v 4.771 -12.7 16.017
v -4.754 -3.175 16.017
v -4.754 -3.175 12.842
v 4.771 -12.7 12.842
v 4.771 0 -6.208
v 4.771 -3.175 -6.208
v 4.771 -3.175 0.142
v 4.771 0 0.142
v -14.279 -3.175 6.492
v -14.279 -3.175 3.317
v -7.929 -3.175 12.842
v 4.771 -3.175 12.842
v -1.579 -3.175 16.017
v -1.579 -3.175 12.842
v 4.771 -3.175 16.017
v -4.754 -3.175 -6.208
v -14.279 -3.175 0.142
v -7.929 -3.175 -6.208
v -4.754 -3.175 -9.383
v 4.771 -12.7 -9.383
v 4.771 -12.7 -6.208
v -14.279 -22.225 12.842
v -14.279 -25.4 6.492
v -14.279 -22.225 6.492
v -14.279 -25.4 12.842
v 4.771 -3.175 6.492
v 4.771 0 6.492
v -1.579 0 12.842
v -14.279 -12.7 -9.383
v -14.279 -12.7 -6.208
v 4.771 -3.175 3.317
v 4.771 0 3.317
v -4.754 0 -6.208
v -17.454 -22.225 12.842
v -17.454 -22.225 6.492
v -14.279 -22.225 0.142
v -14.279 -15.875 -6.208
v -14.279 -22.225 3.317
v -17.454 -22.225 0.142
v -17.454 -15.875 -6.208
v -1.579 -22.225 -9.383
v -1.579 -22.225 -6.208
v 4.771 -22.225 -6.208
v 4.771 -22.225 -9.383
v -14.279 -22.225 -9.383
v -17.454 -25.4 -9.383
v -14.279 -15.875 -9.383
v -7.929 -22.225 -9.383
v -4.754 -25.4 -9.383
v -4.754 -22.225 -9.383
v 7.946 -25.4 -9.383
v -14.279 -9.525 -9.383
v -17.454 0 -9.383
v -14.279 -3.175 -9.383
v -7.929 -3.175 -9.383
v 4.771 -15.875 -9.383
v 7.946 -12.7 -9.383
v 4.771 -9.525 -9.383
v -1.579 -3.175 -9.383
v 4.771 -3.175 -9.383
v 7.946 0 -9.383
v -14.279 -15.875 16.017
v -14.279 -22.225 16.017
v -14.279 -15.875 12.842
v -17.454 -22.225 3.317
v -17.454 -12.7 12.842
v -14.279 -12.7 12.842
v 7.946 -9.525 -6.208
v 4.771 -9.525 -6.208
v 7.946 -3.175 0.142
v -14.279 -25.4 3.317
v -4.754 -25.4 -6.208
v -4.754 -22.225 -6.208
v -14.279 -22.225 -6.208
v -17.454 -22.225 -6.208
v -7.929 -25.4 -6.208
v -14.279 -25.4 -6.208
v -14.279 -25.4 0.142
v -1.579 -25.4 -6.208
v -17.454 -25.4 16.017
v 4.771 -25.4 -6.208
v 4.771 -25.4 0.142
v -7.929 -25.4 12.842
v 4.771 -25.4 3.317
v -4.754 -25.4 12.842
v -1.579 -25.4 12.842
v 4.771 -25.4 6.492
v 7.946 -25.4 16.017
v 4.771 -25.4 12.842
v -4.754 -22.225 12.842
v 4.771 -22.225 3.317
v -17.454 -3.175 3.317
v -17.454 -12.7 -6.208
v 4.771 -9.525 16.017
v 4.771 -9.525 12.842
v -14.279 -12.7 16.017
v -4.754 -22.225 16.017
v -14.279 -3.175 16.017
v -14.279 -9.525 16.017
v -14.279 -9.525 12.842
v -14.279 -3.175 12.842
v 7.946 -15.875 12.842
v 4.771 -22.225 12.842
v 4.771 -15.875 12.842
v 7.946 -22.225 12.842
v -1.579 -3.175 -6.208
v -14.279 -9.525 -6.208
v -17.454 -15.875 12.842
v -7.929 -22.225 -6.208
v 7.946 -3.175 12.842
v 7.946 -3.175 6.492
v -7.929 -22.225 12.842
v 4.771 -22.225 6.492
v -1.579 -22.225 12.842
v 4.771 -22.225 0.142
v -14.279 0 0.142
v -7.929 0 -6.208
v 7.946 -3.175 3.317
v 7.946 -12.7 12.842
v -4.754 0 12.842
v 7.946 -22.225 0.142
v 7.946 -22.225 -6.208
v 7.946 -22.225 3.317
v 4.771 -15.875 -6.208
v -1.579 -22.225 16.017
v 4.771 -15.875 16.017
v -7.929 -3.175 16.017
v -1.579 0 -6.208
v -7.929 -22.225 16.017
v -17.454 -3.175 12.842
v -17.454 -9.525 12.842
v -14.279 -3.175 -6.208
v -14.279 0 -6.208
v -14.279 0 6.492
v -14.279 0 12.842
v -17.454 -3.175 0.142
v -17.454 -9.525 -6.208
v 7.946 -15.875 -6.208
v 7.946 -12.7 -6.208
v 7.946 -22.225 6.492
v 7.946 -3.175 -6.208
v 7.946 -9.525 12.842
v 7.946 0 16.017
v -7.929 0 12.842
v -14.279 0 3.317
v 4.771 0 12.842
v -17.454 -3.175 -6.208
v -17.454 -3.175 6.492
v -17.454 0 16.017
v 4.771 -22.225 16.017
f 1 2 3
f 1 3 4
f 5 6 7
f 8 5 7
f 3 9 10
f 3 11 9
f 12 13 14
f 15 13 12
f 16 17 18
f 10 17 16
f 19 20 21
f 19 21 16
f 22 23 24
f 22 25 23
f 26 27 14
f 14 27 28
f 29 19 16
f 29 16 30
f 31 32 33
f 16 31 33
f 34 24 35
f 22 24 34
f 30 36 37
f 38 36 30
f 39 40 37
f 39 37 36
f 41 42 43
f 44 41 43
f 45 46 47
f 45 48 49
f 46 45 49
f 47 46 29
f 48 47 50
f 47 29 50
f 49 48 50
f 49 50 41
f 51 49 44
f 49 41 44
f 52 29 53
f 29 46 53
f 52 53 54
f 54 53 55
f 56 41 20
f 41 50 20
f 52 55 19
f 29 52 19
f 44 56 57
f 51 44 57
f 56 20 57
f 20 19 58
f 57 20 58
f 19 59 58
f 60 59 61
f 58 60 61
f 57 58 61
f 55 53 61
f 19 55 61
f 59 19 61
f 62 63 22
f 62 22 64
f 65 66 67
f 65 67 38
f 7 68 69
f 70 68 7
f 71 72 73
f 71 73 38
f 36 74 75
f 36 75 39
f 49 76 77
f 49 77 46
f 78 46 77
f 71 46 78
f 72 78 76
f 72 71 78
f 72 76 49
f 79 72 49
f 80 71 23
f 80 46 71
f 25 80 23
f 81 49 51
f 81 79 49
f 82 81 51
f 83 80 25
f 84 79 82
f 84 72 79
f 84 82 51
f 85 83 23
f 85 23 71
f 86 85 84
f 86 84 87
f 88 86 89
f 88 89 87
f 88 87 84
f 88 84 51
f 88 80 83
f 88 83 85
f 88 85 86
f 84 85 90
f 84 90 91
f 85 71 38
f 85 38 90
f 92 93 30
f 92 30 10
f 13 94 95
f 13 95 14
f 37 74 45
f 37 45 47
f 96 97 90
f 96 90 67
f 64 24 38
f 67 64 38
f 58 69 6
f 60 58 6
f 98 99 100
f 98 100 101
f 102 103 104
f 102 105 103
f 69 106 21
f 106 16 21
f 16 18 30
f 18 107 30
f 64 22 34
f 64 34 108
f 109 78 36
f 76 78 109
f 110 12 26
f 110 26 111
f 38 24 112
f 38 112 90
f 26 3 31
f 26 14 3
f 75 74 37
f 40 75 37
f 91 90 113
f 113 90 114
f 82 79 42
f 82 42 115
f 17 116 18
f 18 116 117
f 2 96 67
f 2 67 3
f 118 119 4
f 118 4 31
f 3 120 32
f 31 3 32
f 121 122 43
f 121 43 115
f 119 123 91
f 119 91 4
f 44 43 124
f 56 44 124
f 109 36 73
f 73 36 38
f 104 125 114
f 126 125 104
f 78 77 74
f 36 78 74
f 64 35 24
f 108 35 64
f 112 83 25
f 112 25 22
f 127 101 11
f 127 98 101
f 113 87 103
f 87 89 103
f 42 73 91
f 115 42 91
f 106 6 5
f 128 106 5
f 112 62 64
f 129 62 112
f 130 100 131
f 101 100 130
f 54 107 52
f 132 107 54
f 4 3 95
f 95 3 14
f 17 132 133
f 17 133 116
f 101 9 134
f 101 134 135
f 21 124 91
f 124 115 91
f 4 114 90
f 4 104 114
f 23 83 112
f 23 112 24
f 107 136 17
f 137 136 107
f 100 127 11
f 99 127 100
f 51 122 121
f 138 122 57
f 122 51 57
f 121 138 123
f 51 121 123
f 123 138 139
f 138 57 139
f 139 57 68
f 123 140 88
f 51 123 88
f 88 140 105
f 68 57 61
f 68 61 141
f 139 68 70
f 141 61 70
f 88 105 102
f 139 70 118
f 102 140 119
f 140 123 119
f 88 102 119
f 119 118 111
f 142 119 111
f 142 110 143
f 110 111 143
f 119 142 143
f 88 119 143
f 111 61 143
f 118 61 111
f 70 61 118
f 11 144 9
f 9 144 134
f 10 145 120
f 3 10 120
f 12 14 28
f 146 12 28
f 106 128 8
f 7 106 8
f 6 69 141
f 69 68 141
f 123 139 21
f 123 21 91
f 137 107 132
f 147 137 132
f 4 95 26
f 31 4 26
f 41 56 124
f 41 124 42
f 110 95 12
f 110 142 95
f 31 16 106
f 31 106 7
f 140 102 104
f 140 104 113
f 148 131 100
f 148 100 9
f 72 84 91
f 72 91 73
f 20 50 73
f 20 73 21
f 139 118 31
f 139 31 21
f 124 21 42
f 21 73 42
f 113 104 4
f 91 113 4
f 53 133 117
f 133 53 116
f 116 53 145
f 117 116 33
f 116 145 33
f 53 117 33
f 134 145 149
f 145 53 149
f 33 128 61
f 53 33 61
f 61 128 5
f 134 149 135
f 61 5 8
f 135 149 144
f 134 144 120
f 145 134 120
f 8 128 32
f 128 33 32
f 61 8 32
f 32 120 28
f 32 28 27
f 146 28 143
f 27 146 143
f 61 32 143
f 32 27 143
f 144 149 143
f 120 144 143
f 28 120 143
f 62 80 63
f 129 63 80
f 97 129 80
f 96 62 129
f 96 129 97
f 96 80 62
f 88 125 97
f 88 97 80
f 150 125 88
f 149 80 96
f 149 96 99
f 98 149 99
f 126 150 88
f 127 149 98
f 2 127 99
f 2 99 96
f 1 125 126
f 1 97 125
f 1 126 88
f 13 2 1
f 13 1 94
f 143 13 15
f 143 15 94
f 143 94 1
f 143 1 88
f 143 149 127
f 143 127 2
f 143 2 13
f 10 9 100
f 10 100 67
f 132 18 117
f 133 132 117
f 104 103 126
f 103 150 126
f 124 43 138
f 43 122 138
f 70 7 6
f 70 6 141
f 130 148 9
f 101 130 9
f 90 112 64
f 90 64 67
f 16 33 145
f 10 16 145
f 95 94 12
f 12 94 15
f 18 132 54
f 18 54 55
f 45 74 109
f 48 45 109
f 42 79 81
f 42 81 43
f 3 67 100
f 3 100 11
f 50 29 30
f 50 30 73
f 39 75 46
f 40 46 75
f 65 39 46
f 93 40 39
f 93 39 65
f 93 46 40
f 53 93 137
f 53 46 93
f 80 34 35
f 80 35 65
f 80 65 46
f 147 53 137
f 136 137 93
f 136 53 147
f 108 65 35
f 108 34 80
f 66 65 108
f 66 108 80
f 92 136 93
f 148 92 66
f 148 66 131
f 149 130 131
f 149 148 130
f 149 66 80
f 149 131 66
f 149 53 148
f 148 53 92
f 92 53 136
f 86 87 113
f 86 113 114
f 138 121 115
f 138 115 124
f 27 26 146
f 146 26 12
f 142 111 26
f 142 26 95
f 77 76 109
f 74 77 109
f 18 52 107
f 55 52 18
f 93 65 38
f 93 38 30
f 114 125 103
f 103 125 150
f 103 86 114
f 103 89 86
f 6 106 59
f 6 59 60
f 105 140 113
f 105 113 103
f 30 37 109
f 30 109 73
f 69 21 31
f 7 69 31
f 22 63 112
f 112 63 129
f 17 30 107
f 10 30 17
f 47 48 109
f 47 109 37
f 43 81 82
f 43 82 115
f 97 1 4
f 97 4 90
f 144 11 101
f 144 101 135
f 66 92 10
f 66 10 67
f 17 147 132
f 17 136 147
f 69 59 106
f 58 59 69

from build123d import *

# Parameters (mm, degrees)
F0_W      = 25.4
F0_H      = 25.4
F1_DEPTH  = 25.4
F2_W      = 19.05
F2_H      = 19.05
F3_DEPTH  = 25.4
F4_W      = 19.05
F4_H      = 19.05
F5_DEPTH  = 25.4
F6_W      = 19.05
F6_H      = 19.05
F7_DEPTH  = 25.4
F9_DEPTH  = 3.175
F11_DEPTH = 3.175
F13_DEPTH = 3.175
F15_DEPTH = 3.175
F17_DEPTH = 3.175
F19_DEPTH = 3.175


with BuildPart() as f1:
    # F0 (on Front) → F1 (new body)
    with BuildSketch(Plane.XZ):
        with Locations((-4.7539575025, 3.3169323578)):
            Rectangle(F0_W, F0_H)
    extrude(amount=F1_DEPTH)

    # F2 (on face) → F3 (cut)
    with BuildSketch(Plane.XZ.offset(25.4)):
        with Locations((-4.7539575025, 3.3169323578)):
            Rectangle(F2_W, F2_H)
    extrude(amount=-F3_DEPTH, mode=Mode.SUBTRACT)

    # F4 (on face) → F5 (cut)
    with BuildSketch(Plane.YZ.offset(7.9460424975)):
        with Locations((-12.7, 3.3169323578)):
            Rectangle(F4_W, F4_H)
    extrude(amount=-F5_DEPTH, mode=Mode.SUBTRACT)

    # F6 (on face) → F7 (cut)
    with BuildSketch(Plane.XY.offset(16.0169323578)):
        with Locations((-4.7539575025, -12.7)):
            Rectangle(F6_W, F6_H)
    extrude(amount=-F7_DEPTH, mode=Mode.SUBTRACT)

    # F8 (on Front) → F9 (join)
    with BuildSketch(Plane.XZ):
        Polygon((7.9460424975, 3.3169323578), (-4.7539575025, 16.0169323578), (-17.4539575025, 3.3169323578), (-4.7539575025, -9.3830676422), align=None)
        Polygon((-14.2789575025, 3.3169323578), (-4.7539575025, 12.8419323578), (4.7710424975, 3.3169323578), (-4.7539575025, -6.2080676422), align=None, mode=Mode.SUBTRACT)
    extrude(amount=F9_DEPTH)

    # F10 (on face) → F11 (join)
    with BuildSketch(Plane.YZ.offset(7.9460424975)):
        Polygon((0, 3.3169323578), (-12.7, 16.0169323578), (-25.4, 3.3169323578), (-12.7, -9.3830676422), align=None)
        Polygon((-22.225, 3.3169323578), (-12.7, 12.8419323578), (-3.175, 3.3169323578), (-12.7, -6.2080676422), align=None, mode=Mode.SUBTRACT)
    extrude(amount=-F11_DEPTH)

    # F12 (on face) → F13 (join)
    with BuildSketch(Plane.XY.offset(16.0169323578)):
        Polygon((7.9460424975, -12.7), (-4.7539575025, 0), (-17.4539575025, -12.7), (-4.7539575025, -25.4), align=None)
        Polygon((-14.2789575025, -12.7), (-4.7539575025, -3.175), (4.7710424975, -12.7), (-4.7539575025, -22.225), align=None, mode=Mode.SUBTRACT)
    extrude(amount=-F13_DEPTH)

    # F14 (on face) → F15 (join)
    with BuildSketch(Plane(origin=(-17.4539575025, 0, 0), x_dir=(0, -1, 0), z_dir=(-1, 0, 0))):
        Polygon((25.4, 3.3169323578), (12.7, 16.0169323578), (0, 3.3169323578), (12.7, -9.3830676422), align=None)
        Polygon((3.175, 3.3169323578), (12.7, 12.8419323578), (22.225, 3.3169323578), (12.7, -6.2080676422), align=None, mode=Mode.SUBTRACT)
    extrude(amount=-F15_DEPTH)

    # F16 (on face) → F17 (join)
    with BuildSketch(Plane.XZ.offset(25.4)):
        Polygon((7.9460424975, 3.3169323578), (-4.7539575025, 16.0169323578), (-17.4539575025, 3.3169323578), (-4.7539575025, -9.3830676422), align=None)
        Polygon((-14.2789575025, 3.3169323578), (-4.7539575025, 12.8419323578), (4.7710424975, 3.3169323578), (-4.7539575025, -6.2080676422), align=None, mode=Mode.SUBTRACT)
    extrude(amount=-F17_DEPTH)

    # F18 (on face) → F19 (join)
    with BuildSketch(Plane(origin=(0, 0, -9.3830676422), x_dir=(1, 0, 0), z_dir=(0, 0, -1))):
        Polygon((7.9460424975, 12.7), (-4.7539575025, 25.4), (-17.4539575025, 12.7), (-4.7539575025, 0), align=None)
        Polygon((-14.2789575025, 12.7), (-4.7539575025, 22.225), (4.7710424975, 12.7), (-4.7539575025, 3.175), align=None, mode=Mode.SUBTRACT)
    extrude(amount=-F19_DEPTH)


solid = f1.part
